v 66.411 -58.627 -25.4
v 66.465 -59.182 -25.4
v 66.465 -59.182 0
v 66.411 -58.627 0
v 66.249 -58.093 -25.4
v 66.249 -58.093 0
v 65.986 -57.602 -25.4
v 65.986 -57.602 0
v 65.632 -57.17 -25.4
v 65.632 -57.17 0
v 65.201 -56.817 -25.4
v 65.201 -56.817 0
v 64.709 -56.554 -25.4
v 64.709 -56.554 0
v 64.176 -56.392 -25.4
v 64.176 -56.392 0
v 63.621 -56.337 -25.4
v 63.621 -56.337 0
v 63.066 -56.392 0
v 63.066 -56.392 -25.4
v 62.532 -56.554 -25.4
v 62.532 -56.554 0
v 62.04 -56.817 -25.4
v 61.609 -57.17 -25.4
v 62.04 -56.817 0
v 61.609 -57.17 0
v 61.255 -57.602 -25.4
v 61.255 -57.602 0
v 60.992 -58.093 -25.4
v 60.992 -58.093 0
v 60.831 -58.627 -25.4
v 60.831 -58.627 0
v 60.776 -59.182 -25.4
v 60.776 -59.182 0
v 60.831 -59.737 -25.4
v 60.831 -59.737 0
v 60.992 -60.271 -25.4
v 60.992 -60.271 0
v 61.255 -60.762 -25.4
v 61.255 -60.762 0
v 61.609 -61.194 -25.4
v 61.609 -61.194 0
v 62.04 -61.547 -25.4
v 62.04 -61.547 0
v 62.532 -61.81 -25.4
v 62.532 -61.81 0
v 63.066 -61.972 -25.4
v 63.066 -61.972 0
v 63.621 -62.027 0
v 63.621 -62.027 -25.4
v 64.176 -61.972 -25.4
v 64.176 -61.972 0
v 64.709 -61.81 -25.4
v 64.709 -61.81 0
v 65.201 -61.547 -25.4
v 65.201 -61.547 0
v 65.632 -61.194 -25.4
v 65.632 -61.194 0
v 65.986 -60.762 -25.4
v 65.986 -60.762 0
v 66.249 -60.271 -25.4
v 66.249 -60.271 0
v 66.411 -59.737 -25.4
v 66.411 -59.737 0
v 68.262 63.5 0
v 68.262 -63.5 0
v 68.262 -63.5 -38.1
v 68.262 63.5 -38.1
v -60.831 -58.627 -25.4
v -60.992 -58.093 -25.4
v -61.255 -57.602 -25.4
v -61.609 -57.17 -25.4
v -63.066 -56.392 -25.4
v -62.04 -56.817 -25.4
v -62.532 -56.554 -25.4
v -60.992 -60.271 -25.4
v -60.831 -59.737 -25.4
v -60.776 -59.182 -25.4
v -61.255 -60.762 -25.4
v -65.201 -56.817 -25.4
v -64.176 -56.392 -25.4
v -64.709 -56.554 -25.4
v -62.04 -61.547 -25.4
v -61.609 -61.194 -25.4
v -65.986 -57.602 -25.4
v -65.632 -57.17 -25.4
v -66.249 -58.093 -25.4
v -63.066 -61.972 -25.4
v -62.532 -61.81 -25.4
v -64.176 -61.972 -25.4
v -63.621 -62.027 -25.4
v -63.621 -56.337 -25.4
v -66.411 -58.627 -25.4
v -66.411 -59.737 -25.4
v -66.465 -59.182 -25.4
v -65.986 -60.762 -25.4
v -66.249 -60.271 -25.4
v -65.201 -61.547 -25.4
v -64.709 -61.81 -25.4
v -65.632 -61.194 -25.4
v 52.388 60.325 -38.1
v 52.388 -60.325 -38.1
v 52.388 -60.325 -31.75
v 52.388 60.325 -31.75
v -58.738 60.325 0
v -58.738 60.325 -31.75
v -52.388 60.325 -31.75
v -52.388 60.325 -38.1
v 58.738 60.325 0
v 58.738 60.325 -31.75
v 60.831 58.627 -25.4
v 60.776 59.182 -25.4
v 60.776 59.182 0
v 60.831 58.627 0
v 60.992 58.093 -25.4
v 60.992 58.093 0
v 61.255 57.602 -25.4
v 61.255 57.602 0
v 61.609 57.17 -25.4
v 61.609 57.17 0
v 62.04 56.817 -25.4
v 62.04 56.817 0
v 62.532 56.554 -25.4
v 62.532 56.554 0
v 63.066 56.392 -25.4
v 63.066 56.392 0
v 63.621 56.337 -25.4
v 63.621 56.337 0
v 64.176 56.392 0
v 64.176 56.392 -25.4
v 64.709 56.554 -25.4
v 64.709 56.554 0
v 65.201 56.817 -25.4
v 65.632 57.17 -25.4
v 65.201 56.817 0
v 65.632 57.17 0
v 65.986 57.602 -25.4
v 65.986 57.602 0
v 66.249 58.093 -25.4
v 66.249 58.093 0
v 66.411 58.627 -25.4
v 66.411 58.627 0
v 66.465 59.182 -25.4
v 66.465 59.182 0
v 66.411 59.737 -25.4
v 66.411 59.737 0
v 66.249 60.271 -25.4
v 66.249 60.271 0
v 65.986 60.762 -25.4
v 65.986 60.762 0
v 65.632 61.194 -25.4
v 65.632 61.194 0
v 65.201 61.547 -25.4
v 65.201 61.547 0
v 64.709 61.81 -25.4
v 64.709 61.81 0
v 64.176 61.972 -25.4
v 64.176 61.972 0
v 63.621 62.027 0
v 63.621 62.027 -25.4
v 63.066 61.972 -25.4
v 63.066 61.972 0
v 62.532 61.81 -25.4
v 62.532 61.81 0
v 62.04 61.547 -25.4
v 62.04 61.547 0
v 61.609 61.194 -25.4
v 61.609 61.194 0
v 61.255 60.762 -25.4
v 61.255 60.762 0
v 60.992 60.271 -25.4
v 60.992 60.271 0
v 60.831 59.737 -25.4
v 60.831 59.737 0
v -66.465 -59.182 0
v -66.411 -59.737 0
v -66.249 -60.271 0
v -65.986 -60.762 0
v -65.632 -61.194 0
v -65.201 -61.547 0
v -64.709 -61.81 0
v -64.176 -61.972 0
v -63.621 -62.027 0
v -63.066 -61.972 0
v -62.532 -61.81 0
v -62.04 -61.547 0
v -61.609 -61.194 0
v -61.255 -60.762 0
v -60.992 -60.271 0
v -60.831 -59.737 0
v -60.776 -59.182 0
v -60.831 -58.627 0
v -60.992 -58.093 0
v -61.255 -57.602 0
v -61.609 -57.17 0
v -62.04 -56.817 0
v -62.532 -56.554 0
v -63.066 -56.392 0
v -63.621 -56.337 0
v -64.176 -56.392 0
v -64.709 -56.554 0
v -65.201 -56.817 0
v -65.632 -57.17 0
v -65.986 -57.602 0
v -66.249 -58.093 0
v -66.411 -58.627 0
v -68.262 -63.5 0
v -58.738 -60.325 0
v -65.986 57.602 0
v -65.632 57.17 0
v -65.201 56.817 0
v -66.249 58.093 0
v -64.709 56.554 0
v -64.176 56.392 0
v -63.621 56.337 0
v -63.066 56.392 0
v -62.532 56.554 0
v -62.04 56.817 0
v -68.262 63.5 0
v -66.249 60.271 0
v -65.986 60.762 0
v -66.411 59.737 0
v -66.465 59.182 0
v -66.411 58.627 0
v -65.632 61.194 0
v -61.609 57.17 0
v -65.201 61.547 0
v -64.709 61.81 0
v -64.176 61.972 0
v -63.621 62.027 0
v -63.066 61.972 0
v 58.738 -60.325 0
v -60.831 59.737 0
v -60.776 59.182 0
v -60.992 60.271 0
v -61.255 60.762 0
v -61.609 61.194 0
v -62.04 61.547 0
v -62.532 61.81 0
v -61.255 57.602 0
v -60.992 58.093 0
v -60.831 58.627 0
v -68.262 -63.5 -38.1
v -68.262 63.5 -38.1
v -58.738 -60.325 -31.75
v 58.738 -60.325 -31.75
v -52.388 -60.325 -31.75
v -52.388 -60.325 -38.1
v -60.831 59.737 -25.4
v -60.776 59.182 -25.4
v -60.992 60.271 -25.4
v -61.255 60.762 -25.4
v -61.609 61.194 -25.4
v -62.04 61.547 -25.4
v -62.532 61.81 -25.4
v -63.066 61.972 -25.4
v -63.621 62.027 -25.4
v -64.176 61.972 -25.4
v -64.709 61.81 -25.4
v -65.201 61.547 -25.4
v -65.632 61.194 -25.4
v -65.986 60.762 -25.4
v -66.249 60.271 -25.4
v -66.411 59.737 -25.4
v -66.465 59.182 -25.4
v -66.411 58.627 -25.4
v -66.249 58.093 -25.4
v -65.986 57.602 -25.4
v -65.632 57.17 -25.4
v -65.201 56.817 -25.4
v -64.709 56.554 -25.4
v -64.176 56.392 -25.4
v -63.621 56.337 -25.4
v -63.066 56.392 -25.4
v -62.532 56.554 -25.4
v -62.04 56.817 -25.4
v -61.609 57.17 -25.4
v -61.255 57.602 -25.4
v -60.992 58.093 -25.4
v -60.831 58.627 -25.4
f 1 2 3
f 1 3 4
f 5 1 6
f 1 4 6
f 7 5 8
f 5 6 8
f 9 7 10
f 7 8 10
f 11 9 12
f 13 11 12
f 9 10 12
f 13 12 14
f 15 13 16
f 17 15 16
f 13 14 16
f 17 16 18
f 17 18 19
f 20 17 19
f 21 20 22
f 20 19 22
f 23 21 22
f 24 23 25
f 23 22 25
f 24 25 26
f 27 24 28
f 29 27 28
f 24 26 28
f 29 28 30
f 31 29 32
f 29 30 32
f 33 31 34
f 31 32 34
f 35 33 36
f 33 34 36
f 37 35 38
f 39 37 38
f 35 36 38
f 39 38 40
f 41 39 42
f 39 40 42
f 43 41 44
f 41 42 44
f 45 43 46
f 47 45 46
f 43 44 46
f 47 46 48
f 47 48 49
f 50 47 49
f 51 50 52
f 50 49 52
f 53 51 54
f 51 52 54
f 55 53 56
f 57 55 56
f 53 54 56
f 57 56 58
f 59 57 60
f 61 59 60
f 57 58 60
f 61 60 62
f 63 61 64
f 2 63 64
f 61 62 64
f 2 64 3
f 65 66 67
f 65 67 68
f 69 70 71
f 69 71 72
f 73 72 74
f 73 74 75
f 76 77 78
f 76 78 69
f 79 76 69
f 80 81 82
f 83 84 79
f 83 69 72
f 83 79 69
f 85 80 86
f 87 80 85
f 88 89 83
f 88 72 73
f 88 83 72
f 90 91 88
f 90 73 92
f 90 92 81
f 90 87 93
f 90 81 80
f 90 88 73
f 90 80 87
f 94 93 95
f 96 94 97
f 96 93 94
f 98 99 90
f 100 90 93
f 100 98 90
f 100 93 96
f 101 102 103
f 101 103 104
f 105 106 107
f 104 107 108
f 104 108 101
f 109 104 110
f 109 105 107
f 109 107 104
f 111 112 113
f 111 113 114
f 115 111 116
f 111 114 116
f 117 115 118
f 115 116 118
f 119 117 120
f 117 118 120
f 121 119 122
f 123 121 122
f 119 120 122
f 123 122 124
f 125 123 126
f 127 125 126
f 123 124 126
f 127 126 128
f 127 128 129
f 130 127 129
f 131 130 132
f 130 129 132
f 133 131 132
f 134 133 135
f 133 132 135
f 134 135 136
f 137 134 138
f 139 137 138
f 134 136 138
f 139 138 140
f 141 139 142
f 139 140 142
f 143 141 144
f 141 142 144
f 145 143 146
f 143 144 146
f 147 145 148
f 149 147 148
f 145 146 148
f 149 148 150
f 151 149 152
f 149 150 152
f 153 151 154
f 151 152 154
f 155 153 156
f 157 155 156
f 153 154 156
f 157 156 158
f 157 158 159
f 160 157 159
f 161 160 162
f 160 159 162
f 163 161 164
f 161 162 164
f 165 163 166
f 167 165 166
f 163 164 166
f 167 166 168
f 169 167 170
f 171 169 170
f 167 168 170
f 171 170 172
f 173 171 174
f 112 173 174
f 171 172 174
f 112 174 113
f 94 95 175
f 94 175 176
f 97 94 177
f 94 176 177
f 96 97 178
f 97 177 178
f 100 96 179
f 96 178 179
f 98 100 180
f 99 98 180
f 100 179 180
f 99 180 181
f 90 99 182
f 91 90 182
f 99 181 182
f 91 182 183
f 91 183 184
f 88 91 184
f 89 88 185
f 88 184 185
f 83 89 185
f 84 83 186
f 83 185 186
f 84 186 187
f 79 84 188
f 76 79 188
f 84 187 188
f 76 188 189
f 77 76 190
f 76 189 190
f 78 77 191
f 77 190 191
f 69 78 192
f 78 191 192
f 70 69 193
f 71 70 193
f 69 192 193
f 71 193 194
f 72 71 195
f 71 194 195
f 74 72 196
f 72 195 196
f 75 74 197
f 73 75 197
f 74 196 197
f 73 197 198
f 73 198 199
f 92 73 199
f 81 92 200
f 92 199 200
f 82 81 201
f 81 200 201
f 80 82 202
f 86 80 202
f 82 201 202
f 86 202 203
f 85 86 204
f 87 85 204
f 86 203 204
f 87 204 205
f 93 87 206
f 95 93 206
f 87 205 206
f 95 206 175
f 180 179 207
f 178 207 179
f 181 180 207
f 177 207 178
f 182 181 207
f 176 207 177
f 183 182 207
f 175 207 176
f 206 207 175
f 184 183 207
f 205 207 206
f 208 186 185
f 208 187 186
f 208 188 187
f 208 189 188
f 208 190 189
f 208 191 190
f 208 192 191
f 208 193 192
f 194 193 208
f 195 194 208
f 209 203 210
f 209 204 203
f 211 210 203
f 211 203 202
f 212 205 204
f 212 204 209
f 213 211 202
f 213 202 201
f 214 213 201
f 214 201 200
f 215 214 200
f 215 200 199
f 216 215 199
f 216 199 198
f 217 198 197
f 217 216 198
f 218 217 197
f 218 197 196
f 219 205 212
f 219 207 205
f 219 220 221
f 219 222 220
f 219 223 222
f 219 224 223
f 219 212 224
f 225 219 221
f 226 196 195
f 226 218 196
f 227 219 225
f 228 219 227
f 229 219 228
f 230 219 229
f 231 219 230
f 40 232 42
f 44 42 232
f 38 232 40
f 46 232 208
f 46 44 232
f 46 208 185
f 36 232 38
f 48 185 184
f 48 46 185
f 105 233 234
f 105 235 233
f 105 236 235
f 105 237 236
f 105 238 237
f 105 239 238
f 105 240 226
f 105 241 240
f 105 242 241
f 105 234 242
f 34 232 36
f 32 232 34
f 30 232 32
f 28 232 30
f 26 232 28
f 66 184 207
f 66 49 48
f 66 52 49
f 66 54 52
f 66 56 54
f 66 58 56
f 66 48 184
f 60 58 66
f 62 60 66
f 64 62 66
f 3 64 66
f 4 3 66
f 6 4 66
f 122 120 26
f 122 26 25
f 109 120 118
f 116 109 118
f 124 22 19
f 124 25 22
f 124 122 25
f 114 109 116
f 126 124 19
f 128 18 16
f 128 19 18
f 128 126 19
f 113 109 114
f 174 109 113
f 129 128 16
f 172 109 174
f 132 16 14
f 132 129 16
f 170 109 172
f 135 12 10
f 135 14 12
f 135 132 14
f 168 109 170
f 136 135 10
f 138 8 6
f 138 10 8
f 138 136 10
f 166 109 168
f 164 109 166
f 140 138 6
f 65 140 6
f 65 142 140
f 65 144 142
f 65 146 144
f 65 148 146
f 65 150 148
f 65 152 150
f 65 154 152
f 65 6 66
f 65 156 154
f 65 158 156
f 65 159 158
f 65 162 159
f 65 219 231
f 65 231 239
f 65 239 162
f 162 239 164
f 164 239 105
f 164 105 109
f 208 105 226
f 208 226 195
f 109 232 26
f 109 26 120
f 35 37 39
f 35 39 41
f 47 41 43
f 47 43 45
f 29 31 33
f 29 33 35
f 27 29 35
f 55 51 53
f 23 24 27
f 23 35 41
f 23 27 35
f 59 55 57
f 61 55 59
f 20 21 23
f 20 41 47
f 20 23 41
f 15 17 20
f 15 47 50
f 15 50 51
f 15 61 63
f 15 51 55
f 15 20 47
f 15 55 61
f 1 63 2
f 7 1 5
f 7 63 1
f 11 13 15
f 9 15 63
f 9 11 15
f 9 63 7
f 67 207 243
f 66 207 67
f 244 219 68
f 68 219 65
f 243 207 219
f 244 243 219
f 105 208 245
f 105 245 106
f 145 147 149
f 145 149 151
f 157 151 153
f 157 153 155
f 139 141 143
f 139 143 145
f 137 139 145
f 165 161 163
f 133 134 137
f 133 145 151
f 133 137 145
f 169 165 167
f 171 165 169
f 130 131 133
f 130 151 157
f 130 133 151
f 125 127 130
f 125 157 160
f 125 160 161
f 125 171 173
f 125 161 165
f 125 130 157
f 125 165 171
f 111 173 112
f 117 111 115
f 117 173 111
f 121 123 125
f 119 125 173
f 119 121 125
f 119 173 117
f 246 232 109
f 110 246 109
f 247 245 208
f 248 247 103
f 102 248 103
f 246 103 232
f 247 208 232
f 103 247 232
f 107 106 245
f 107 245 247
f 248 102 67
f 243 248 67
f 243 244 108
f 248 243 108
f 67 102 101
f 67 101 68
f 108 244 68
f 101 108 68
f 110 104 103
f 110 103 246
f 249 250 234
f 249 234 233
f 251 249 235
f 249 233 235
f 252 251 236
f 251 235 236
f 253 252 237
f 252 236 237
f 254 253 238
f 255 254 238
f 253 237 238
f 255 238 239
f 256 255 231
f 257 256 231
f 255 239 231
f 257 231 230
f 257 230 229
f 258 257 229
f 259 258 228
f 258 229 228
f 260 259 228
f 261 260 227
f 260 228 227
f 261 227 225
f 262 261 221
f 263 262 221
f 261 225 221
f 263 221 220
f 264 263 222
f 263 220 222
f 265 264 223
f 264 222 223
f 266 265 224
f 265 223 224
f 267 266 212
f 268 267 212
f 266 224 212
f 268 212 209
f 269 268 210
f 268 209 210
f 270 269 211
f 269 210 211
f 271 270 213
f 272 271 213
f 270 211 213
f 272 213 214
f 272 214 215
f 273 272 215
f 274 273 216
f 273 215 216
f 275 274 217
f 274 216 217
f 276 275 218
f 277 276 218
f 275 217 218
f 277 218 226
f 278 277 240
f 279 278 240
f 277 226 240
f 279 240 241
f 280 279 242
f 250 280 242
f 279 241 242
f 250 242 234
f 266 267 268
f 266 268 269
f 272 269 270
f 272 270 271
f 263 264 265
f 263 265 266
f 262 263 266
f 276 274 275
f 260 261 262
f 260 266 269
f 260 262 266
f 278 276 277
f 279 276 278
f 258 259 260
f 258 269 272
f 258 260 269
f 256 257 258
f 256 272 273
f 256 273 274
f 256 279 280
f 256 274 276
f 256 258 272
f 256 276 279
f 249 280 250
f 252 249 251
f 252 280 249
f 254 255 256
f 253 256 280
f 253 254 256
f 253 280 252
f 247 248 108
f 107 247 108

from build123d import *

# Parameters (mm, degrees)
SKETCH2_W           = 136.525
SKETCH2_H           = 127
BOSS_EXTRUDE1_DEPTH = 38.1
SKETCH3_W           = 117.475
SKETCH3_H           = 120.65
CUT_EXTRUDE2_DEPTH  = 31.75
SKETCH4_W           = 104.775
SKETCH4_H           = 120.65
CUT_EXTRUDE3_DEPTH  = 38.1
SKETCH5_R           = 2.8448
CUT_EXTRUDE4_DEPTH  = 25.4


with BuildPart() as part:
    # Sketch2 → Boss-Extrude1 (new body)
    with BuildSketch(Plane.XY):
        Rectangle(SKETCH2_W, SKETCH2_H)
    extrude(amount=-BOSS_EXTRUDE1_DEPTH)

    # Sketch3 → Cut-Extrude2 (cut)
    with BuildSketch(Plane.XY):
        Rectangle(SKETCH3_W, SKETCH3_H)
    extrude(amount=-CUT_EXTRUDE2_DEPTH, mode=Mode.SUBTRACT)

    # Sketch4 → Cut-Extrude3 (cut)
    with BuildSketch(Plane(origin=(0, 0, -38.1), x_dir=(-1, 0, 0), z_dir=(0, 0, -1))):
        Rectangle(SKETCH4_W, SKETCH4_H)
    extrude(amount=-CUT_EXTRUDE3_DEPTH, mode=Mode.SUBTRACT)

    # Sketch5 → Cut-Extrude4 (cut)
    with BuildSketch(Plane.XY):
        with Locations((-63.62065, 59.182)):
            Circle(SKETCH5_R)
        with Locations(Location((63.62065, 59.182, 0), (0, 0, 180))):
            Circle(SKETCH5_R)
        with Locations((63.62065, -59.182)):
            Circle(SKETCH5_R)
        with Locations(Location((-63.62065, -59.182, 0), (0, 0, 180))):
            Circle(SKETCH5_R)
    extrude(amount=-CUT_EXTRUDE4_DEPTH, mode=Mode.SUBTRACT)


solid = part.part
